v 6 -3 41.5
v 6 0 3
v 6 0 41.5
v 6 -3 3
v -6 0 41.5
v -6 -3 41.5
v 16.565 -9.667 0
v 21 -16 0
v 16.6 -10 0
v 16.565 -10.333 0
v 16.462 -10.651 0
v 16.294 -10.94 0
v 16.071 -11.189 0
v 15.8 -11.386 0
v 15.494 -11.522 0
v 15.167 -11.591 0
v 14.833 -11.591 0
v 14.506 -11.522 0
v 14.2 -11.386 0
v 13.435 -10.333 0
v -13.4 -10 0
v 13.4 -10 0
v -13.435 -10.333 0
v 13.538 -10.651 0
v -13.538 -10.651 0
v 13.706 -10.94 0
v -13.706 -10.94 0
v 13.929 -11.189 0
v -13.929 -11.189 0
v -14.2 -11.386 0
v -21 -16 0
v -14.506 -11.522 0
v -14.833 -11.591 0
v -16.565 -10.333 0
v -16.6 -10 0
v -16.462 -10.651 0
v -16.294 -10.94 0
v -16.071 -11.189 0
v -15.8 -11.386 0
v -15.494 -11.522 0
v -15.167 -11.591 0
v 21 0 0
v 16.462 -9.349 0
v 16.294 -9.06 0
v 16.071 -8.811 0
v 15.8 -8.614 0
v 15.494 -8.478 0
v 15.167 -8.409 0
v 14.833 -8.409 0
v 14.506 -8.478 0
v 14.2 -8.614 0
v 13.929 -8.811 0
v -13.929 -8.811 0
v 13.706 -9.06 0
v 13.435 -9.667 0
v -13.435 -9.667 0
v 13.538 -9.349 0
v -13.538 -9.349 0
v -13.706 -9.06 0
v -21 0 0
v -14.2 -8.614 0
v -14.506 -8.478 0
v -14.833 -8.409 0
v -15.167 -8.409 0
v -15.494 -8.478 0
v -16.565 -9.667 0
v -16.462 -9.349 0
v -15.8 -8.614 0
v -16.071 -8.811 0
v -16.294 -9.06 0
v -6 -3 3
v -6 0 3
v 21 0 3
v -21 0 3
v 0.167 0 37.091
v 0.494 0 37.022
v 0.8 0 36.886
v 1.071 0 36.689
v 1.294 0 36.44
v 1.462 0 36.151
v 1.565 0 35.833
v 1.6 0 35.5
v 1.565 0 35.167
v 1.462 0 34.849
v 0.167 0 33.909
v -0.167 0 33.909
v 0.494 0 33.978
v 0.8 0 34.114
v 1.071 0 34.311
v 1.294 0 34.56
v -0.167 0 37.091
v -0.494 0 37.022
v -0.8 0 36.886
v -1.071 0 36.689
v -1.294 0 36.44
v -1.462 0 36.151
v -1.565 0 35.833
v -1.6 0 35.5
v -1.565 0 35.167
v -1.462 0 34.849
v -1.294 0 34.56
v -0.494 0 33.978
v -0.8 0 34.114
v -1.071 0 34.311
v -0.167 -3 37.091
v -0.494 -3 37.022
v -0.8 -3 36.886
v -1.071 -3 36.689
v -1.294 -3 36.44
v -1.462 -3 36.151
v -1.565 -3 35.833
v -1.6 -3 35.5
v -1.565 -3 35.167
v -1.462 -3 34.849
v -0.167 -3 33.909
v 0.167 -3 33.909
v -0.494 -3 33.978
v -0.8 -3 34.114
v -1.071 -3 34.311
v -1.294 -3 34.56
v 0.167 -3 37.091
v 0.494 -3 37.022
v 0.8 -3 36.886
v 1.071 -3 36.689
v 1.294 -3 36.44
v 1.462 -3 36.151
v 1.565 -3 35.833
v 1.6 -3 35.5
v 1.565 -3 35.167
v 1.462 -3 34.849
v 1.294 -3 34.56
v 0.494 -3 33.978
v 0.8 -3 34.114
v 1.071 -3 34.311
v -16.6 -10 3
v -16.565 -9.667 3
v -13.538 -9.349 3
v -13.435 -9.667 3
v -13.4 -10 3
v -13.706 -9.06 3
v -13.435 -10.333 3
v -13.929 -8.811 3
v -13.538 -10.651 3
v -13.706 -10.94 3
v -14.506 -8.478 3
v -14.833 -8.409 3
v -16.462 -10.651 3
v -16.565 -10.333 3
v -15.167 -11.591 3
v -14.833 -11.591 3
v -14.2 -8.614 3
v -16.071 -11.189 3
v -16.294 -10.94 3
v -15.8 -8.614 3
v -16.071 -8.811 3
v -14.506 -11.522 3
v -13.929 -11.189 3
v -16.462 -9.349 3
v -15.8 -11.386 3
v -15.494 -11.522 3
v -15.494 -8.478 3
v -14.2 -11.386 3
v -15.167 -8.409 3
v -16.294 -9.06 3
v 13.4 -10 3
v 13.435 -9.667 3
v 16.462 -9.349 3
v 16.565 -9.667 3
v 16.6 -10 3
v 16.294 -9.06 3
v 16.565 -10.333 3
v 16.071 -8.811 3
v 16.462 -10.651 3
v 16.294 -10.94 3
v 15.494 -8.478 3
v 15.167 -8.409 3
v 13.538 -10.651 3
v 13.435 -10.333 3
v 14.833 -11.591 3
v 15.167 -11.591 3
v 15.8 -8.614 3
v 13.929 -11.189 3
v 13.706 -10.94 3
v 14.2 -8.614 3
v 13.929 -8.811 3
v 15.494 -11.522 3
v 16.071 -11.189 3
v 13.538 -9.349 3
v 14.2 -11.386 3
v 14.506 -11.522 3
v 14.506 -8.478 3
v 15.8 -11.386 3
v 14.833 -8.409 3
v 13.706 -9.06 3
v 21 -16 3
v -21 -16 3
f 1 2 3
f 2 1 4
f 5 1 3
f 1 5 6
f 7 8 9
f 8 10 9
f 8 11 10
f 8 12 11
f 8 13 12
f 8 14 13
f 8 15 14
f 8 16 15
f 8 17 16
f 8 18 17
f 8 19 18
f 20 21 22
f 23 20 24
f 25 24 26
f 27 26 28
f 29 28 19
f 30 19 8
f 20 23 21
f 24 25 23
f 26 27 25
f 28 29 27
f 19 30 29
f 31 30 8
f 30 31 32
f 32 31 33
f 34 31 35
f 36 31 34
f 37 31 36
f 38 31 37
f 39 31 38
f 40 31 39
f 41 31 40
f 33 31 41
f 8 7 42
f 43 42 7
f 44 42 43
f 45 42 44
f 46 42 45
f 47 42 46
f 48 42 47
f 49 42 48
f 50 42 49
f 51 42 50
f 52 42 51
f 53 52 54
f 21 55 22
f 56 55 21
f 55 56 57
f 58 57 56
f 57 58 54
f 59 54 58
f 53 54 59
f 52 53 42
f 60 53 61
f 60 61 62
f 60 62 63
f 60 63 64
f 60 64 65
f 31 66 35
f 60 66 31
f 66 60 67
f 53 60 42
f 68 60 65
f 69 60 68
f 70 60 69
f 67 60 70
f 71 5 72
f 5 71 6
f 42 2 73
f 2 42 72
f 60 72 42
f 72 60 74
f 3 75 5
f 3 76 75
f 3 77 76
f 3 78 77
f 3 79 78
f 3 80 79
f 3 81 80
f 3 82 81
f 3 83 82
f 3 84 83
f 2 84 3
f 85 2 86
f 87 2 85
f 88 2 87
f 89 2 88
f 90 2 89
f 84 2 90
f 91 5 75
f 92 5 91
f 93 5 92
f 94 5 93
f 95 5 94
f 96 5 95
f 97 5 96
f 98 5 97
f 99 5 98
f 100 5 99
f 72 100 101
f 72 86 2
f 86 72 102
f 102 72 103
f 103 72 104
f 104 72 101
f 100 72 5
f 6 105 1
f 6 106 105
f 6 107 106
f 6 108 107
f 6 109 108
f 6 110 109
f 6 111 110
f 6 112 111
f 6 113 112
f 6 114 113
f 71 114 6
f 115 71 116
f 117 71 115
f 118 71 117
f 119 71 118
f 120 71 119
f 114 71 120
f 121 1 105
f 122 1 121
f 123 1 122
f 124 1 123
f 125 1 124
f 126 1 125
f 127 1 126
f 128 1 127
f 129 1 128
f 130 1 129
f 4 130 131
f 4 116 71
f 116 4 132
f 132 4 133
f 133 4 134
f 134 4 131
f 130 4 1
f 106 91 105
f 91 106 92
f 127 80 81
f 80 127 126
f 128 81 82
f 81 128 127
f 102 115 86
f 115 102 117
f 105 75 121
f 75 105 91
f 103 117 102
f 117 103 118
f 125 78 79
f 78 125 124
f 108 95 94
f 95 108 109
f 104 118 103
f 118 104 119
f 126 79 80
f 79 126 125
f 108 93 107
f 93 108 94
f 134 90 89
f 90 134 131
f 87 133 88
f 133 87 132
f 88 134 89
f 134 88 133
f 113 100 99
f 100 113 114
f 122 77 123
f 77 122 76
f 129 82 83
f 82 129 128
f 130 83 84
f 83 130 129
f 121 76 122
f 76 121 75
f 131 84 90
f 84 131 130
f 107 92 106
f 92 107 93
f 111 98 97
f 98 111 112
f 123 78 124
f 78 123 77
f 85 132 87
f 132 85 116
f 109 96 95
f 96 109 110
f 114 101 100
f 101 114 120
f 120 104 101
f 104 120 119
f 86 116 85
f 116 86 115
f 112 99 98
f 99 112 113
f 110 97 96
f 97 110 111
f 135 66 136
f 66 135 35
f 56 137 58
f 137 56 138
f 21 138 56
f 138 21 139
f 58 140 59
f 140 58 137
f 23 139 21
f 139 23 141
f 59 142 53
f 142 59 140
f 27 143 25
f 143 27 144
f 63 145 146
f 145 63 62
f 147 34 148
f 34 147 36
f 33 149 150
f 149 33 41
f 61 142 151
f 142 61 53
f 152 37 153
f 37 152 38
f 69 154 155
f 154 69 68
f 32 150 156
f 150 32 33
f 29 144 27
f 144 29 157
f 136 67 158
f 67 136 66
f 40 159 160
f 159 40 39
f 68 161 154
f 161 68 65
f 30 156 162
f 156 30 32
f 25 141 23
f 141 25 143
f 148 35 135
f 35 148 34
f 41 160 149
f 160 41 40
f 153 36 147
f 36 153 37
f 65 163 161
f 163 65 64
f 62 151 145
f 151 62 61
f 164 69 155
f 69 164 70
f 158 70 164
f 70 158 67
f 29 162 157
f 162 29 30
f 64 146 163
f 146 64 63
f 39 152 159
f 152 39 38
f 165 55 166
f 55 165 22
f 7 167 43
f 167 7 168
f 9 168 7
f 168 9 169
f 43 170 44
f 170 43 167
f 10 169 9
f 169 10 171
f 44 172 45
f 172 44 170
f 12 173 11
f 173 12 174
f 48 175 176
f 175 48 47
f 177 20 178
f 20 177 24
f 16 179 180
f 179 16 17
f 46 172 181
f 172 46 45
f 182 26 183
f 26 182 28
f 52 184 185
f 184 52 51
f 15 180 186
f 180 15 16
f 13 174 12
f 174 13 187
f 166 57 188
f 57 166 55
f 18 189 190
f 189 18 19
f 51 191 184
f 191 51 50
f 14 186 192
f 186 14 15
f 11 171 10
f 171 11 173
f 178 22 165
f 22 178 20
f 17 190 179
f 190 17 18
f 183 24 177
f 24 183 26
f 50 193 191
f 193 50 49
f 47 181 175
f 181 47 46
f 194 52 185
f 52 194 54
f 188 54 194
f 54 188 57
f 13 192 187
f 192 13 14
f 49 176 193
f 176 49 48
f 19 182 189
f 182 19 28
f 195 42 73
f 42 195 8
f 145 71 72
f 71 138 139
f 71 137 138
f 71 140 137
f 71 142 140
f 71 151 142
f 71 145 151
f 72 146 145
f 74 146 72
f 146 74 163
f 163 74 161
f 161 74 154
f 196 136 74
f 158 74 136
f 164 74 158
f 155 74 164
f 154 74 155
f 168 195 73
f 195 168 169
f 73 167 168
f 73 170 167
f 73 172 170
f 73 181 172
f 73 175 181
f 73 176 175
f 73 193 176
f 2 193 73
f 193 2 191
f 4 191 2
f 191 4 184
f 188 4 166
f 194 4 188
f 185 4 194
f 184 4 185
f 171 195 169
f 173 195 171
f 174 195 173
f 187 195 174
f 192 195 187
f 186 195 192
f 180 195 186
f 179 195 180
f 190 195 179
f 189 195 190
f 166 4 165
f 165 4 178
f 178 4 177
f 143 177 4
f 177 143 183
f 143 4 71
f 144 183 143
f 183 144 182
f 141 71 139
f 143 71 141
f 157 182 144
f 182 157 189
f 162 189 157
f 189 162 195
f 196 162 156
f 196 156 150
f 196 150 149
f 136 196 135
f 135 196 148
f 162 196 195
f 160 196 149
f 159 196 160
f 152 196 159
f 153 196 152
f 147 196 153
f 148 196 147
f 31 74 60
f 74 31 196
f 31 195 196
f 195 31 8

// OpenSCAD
//Hole diameter
vertical_hole_diameter = 3.2;
//Distance between the hole center and the ground plate
ground_hole_distance = 35.5;
//Vertical width
vertical_width = 12;
//Width of the holder
object_width = 3;
//Distance between printer-frame-front and the mounting holes
frame_hole_distance = 10;
//Diameter of ground mounting hole
ground_hole_diameter = 3.2;
// Count of holes for ground mounting
ground_mounting_hole_count = 2;
//Distance between mounting
ground_mounting_hole_distance = 30;

module create_vertical_wall() {
    translate([0, -(object_width / 2)])
    difference() {
        translate([0, 0, (ground_hole_distance + vertical_width / 2) / 2]) {
            cube([vertical_width, object_width, ground_hole_distance + vertical_width / 2], center = true);
        }
        translate([0, 0, ground_hole_distance]) {
            rotate([90, 0, 0])
            scale([1/100, 1/100, 1/100])
            cylinder(d = vertical_hole_diameter * 100, h = object_width * 102, center = true);
        }
    }
}

module create_ground_plate() {
    
    if(ground_mounting_hole_count==1) {
        difference() {
            translate([0, -(frame_hole_distance + vertical_width / 2) / 2, object_width / 2]) {
                cube([vertical_width, frame_hole_distance + vertical_width / 2, object_width], center = true);
            }
            translate([0, -frame_hole_distance, object_width / 2]) {
                scale([1/100, 1/100, 1/100])
                cylinder(d = ground_hole_diameter * 100, h = object_width * 102,center = true);
            }
        }   
    } else {
        difference() {
            translate([0, -(frame_hole_distance + vertical_width / 2) / 2, object_width / 2]) {
                    cube([vertical_width + ground_mounting_hole_distance * (ground_mounting_hole_count - 1), frame_hole_distance + vertical_width / 2, object_width], center = true); 
                }
            if(ground_mounting_hole_count % 2 == 0) {

                    for(i = [0:(ground_mounting_hole_count / 2)]) {
                        translate([-((ground_mounting_hole_distance / 2) + ground_mounting_hole_distance * i) , -frame_hole_distance, object_width / 2]) {
                            scale([1/100, 1/100, 1/100])
                            cylinder(d = ground_hole_diameter * 100, h = object_width * 102,center = true);
                        }
                        translate([((ground_mounting_hole_distance / 2) + ground_mounting_hole_distance * i), -frame_hole_distance, object_width / 2]) {
                            scale([1/100, 1/100, 1/100])
                            cylinder(d = ground_hole_diameter * 100, h = object_width * 102,center = true);
                        }
                    }
                //}
            } else {
                    translate([0, -frame_hole_distance, object_width / 2]) {
                        scale([1/100, 1/100, 1/100])
                        cylinder(d = ground_hole_diameter * 100, h = object_width * 102,center = true);
                    }
                    for(i = [1:((ground_mounting_hole_count-1) / 2)]) {
                        translate([-ground_mounting_hole_distance * i, -frame_hole_distance, object_width / 2]) {
                            scale([1/100, 1/100, 1/100])
                            cylinder(d = ground_hole_diameter * 100, h = object_width * 102,center = true);
                        }
                        translate([ground_mounting_hole_distance * i, -frame_hole_distance, object_width / 2]) {
                            scale([1/100, 1/100, 1/100])
                            cylinder(d = ground_hole_diameter * 100, h = object_width * 102,center = true);
                        }
                    }
            
            
            
    //    }*/
           }
       }
    }
}

create_vertical_wall();
create_ground_plate();
